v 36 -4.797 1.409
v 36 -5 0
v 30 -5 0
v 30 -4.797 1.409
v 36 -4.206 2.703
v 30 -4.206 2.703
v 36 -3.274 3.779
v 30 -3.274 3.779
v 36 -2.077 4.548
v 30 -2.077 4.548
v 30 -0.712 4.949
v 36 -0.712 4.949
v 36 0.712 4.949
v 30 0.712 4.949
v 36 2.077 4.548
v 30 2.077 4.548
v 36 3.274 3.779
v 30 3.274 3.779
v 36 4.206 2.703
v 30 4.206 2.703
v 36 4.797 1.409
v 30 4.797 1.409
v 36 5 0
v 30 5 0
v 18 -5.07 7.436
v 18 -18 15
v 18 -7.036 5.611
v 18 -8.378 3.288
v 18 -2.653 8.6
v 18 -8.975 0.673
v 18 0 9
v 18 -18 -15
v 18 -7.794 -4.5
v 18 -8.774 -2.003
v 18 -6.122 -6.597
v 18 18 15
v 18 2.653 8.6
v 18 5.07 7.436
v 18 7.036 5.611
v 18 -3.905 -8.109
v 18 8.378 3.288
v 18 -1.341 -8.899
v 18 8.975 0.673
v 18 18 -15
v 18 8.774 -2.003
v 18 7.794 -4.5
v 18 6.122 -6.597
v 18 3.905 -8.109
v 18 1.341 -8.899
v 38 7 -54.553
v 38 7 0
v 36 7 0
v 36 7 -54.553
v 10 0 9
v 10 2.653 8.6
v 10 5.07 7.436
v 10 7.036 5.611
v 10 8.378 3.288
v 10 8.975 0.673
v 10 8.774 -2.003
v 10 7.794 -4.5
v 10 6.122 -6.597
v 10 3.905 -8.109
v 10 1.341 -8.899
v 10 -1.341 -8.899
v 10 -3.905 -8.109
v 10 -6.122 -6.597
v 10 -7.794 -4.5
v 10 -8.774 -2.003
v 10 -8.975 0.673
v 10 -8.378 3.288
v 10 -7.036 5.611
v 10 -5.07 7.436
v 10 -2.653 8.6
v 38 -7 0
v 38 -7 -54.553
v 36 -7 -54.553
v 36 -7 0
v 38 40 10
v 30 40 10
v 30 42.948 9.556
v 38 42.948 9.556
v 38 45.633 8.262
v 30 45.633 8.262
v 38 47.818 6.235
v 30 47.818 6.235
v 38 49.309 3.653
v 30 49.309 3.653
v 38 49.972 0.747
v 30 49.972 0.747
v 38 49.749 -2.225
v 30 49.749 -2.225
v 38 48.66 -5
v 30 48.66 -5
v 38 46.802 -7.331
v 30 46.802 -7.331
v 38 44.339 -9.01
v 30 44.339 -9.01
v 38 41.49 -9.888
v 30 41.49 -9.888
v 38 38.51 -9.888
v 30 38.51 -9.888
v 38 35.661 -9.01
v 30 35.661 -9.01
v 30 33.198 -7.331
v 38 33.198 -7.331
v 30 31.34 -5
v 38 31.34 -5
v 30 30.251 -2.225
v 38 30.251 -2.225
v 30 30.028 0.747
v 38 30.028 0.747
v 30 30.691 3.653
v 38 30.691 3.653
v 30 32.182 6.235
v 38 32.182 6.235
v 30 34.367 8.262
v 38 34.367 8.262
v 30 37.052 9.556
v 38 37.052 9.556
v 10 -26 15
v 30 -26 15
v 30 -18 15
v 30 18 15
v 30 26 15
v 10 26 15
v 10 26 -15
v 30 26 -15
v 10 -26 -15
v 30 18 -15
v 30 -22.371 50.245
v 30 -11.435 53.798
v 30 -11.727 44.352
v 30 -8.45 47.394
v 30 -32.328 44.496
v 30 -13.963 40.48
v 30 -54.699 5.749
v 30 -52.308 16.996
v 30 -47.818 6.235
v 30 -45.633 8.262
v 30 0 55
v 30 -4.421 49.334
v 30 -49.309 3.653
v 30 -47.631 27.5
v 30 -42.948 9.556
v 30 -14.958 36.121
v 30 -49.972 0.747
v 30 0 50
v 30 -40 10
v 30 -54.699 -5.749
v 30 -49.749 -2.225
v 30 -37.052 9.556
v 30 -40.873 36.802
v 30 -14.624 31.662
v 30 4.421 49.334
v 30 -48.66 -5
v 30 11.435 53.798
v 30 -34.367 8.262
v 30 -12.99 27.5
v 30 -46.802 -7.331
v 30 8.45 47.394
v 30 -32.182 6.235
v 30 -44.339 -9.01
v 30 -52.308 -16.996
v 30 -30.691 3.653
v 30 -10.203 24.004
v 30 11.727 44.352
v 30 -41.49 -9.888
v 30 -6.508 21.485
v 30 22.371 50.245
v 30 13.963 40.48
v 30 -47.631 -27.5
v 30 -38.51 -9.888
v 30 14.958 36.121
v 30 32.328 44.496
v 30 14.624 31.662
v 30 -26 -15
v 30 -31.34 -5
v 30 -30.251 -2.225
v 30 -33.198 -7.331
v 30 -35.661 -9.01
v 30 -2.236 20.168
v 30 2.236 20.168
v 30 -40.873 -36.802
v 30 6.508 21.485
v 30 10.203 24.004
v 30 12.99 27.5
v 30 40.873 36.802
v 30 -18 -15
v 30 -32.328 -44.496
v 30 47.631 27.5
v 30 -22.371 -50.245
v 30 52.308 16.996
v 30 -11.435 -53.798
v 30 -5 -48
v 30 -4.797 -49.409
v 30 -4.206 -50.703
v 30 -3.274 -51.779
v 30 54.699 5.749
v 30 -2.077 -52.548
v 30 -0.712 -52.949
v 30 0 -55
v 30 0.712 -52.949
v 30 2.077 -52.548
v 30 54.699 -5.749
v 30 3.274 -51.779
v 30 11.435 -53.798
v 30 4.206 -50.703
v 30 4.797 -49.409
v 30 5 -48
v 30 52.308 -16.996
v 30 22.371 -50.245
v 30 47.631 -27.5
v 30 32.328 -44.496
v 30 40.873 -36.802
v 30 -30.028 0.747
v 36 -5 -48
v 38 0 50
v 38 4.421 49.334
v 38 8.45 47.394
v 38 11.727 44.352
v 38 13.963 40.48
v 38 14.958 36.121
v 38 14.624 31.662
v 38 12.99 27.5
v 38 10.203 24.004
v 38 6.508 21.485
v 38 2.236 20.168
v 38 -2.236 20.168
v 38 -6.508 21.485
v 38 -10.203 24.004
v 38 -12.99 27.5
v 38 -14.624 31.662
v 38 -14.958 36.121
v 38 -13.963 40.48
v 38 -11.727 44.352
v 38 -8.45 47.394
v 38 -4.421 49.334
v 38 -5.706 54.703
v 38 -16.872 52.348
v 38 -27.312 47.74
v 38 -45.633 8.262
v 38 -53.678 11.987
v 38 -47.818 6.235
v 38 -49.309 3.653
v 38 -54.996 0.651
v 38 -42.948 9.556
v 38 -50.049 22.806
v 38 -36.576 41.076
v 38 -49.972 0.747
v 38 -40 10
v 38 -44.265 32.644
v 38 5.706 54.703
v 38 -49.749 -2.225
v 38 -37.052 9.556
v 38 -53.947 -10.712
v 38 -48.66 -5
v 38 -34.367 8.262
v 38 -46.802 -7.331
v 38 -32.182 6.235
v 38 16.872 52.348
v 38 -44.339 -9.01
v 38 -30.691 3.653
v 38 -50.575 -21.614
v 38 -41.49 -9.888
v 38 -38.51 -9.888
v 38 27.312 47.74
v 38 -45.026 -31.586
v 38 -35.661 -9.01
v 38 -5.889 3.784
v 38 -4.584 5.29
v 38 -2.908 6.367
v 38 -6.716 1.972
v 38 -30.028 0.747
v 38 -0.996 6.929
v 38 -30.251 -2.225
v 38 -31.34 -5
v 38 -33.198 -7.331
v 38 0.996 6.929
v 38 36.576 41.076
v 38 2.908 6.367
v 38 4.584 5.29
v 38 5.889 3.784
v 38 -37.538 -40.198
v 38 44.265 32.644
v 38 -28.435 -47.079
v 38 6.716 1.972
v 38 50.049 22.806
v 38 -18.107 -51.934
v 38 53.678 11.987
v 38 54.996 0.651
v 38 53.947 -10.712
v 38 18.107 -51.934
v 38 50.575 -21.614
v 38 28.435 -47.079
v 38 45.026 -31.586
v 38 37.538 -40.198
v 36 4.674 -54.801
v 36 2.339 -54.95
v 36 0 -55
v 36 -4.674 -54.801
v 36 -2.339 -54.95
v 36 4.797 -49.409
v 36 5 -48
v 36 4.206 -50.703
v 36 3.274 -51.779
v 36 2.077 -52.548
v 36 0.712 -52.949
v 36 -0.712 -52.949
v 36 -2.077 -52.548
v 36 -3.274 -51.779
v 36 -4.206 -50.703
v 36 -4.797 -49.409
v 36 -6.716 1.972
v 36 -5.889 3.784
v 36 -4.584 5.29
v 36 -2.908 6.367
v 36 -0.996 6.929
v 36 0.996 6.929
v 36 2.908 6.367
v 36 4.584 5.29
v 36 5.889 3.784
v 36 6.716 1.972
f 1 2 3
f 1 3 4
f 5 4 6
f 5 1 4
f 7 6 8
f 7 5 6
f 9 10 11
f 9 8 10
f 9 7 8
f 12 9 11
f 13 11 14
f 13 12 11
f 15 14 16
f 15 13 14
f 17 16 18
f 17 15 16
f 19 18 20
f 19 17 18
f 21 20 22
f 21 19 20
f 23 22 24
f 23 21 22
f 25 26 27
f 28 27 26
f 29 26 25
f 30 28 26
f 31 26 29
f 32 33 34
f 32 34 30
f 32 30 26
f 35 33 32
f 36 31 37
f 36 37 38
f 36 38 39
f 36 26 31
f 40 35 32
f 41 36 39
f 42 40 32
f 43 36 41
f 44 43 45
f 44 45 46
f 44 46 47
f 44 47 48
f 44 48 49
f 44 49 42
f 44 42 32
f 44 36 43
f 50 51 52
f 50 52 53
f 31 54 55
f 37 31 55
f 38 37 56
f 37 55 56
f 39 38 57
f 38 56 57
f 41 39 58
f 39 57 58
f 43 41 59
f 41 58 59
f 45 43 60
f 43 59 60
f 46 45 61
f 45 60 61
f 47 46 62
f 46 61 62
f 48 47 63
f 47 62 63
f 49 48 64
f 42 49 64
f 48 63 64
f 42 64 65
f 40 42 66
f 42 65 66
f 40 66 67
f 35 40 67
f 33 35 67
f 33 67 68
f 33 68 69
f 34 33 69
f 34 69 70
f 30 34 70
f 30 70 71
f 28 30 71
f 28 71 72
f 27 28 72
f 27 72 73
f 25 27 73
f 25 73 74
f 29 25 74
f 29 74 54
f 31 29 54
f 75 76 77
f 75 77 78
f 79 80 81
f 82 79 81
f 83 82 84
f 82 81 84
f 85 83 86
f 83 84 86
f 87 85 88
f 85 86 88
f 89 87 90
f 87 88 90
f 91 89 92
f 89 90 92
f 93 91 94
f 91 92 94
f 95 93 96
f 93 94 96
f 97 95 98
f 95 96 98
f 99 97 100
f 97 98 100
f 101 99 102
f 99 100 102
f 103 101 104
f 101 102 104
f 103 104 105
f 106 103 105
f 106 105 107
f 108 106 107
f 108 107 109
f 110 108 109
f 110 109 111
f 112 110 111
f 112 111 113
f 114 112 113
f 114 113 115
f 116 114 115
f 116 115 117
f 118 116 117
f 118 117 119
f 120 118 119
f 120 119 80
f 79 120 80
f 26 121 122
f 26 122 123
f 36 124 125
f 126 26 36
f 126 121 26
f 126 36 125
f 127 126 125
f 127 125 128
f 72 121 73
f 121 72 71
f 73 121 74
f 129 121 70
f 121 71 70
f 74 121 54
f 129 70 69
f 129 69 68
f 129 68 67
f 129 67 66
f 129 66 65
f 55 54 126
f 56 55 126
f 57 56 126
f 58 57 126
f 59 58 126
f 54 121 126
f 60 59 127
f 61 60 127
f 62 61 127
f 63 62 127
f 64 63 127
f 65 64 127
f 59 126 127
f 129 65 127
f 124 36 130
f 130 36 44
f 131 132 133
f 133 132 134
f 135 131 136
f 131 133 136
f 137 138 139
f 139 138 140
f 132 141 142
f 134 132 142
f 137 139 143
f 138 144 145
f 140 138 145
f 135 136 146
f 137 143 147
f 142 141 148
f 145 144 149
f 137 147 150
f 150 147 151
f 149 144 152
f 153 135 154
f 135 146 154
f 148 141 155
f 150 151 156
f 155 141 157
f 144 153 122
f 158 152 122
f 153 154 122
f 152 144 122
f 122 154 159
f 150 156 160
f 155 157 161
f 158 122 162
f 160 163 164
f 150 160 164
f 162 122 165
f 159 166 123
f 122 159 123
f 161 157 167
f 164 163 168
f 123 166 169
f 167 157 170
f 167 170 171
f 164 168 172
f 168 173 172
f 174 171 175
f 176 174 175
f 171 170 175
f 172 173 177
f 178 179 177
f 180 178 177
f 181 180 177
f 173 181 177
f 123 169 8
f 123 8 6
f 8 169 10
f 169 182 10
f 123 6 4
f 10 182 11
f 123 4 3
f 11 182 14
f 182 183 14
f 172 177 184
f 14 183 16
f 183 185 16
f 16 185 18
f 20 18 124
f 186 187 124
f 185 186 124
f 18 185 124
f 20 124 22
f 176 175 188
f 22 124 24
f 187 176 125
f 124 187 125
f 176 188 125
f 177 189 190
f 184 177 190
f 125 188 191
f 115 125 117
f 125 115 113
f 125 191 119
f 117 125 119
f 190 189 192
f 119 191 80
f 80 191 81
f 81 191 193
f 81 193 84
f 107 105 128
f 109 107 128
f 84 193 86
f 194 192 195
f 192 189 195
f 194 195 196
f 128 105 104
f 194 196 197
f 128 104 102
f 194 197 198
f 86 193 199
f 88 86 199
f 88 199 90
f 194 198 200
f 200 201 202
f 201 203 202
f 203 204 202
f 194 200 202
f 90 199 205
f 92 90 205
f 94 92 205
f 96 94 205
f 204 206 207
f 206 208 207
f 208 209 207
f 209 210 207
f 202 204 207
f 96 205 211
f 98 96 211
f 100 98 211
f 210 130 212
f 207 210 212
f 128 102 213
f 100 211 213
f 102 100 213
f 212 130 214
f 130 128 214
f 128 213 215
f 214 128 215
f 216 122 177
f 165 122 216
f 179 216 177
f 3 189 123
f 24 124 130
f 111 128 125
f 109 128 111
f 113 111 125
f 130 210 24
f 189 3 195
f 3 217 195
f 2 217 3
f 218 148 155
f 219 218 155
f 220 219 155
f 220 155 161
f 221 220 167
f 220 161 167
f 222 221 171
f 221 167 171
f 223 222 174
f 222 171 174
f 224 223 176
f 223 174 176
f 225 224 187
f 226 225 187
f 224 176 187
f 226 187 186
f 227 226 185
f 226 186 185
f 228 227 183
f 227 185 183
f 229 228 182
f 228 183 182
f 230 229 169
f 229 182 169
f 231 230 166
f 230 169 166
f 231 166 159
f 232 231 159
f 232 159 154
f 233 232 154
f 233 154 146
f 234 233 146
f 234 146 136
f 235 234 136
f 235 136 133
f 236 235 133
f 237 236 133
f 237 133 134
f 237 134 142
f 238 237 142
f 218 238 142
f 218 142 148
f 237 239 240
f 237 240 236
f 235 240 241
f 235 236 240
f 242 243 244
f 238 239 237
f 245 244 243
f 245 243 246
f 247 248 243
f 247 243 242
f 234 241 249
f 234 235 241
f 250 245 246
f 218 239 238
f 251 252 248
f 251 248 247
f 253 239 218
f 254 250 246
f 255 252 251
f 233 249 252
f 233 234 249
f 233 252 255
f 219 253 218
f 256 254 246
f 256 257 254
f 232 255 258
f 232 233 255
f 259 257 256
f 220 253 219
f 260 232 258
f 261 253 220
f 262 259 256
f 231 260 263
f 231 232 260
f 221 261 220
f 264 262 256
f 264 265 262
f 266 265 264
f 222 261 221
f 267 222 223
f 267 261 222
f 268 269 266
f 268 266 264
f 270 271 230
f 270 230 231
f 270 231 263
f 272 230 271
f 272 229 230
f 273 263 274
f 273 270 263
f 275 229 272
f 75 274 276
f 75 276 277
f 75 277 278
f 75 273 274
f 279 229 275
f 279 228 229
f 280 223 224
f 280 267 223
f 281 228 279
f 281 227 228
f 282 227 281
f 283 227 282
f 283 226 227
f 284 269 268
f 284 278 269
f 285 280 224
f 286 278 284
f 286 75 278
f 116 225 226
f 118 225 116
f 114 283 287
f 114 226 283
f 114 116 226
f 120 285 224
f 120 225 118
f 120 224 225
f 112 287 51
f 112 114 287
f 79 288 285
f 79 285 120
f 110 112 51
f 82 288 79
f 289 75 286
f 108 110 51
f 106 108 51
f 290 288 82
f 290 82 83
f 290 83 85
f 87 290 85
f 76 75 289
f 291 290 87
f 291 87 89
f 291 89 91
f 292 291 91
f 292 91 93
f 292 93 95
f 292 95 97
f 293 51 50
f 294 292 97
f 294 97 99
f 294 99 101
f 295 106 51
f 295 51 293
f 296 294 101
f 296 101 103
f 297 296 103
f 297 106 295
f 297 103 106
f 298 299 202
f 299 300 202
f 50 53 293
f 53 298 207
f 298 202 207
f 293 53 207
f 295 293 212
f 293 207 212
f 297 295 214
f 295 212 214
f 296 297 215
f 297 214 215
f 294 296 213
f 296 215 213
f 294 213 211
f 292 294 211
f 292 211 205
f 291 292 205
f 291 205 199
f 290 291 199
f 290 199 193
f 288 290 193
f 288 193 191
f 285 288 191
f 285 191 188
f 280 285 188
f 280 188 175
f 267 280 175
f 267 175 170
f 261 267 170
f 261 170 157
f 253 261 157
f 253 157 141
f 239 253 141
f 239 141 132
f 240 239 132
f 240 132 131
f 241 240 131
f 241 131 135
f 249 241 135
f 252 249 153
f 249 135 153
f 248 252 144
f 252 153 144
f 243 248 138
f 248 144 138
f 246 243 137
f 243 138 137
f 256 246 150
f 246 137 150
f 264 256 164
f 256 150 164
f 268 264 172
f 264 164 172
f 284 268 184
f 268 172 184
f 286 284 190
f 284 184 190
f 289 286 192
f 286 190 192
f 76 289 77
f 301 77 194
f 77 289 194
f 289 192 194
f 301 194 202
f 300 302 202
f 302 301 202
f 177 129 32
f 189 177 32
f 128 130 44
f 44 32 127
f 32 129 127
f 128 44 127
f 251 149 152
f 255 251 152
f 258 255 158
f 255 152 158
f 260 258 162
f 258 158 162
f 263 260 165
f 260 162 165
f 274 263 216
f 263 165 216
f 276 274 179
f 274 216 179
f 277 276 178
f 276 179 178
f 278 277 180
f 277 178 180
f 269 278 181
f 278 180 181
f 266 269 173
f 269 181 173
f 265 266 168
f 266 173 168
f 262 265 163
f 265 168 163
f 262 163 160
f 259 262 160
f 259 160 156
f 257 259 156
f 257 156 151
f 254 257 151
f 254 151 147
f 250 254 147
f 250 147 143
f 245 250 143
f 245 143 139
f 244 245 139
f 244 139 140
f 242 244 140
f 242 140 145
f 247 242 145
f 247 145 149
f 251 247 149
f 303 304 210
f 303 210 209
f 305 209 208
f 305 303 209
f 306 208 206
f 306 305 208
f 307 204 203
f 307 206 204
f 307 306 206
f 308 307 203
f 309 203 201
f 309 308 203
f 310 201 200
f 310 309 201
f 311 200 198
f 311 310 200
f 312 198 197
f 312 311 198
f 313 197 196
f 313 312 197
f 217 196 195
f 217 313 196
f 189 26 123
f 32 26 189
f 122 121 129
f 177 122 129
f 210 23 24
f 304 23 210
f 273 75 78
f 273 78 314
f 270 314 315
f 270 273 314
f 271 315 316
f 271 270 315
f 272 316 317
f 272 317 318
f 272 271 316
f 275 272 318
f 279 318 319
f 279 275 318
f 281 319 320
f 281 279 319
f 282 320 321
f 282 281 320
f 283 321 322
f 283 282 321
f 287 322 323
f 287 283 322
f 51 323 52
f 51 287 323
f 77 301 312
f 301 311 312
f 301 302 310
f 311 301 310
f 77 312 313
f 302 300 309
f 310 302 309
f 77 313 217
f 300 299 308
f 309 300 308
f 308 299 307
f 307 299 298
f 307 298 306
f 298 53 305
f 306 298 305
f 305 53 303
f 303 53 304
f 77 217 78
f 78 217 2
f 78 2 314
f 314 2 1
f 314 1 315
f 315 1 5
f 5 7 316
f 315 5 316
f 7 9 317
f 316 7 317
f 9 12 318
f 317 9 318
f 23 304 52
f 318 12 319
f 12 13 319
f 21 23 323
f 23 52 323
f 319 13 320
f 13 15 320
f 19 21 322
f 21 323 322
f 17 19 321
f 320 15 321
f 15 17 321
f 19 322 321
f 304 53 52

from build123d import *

# Parameters (mm, degrees)
SKETCH_1_R          = 7.5
EXTRUDE_1_DEPTH     = 10
SKETCH_5_W          = 30
SKETCH_5_H          = 52
EXTRUDE_2_DEPTH     = 8
SKETCH_6_W          = 30
SKETCH_6_H          = 8
EXTRUDE_3_DEPTH     = 12
SKETCH_7_R          = 55
EXTRUDE_4_DEPTH     = 8
CUT_EXTRUDE_4_REACH = 40
CUT_EXTRUDE_6_DEPTH = 2
CUT_EXTRUDE_7_REACH = 40
SKETCH_12_R         = 9
SKETCH_13_R         = 10
SKETCH_13_R_2       = 15
CUT_EXTRUDE_8_DEPTH = 10


with BuildPart() as part:
    # 草图1 → 凸台-拉伸1 (new body)
    with BuildSketch(Plane(origin=(0, 0, 0), x_dir=(0, 0, -1), z_dir=(1, 0, 0))):
        Circle(SKETCH_1_R)
    extrude(amount=EXTRUDE_1_DEPTH)

    # 草图5 → 凸台-拉伸2 (add)
    with BuildSketch(Plane(origin=(10, 0, 0), x_dir=(0, 0, -1), z_dir=(1, 0, 0))):
        Rectangle(SKETCH_5_W, SKETCH_5_H)
    extrude(amount=EXTRUDE_2_DEPTH)

    # 草图6 → 凸台-拉伸3 (add)
    with BuildSketch(Plane(origin=(18, 0, 0), x_dir=(0, 0, -1), z_dir=(1, 0, 0))):
        with Locations((0, 22)):
            Rectangle(SKETCH_6_W, SKETCH_6_H)
        with Locations((0, -22)):
            Rectangle(SKETCH_6_W, SKETCH_6_H)
    extrude(amount=EXTRUDE_3_DEPTH)

    # 草图7 → 凸台-拉伸4 (add)
    with BuildSketch(Plane(origin=(30, 0, 0), x_dir=(0, 0, -1), z_dir=(1, 0, 0))):
        Circle(SKETCH_7_R)
    extrude(amount=EXTRUDE_4_DEPTH)

    # 草图8 → 切除-拉伸4 (cut, up to next)
    with BuildSketch(Plane(origin=(38, 0, 0), x_dir=(0, 0, -1), z_dir=(1, 0, 0)), mode=Mode.PRIVATE) as cut_extrude_4_sk1:
        with BuildLine():
            Line((0, 5), (48, 5))
            ThreePointArc((48, 5), (53, 0), (48, -5))
            Line((48, -5), (0, -5))
            ThreePointArc((0, -5), (-5, 0), (0, 5))
        make_face()
    cut_extrude_4_tool1 = extrude(cut_extrude_4_sk1.sketch, amount=-CUT_EXTRUDE_4_REACH, mode=Mode.PRIVATE) & part.part
    add(cut_extrude_4_tool1.solids().sort_by_distance((38, 0, -24))[0], mode=Mode.SUBTRACT)

    # 草图11 → 切除-拉伸6 (cut)
    with BuildSketch(Plane(origin=(38, 0, 0), x_dir=(0, 0, -1), z_dir=(1, 0, 0))):
        with BuildLine():
            Line((0, 7), (54.552726788, 7))
            ThreePointArc((54.552726788, 7), (55, 0), (54.552726788, -7))
            Line((54.552726788, -7), (0, -7))
            ThreePointArc((0, -7), (-7, 0), (0, 7))
        make_face()
    extrude(amount=-CUT_EXTRUDE_6_DEPTH, mode=Mode.SUBTRACT)

    # 草图12 → 切除-拉伸7 (cut, up to next)
    with BuildSketch(Plane.ZY, mode=Mode.PRIVATE) as cut_extrude_7_sk1:
        Circle(SKETCH_12_R)
    cut_extrude_7_tool1 = extrude(cut_extrude_7_sk1.sketch, amount=-CUT_EXTRUDE_7_REACH, mode=Mode.PRIVATE) & part.part
    add(cut_extrude_7_tool1.solids().sort_by_distance((0, 0, 0))[0], mode=Mode.SUBTRACT)

    # 草图13 → 切除-拉伸8 (cut)
    with BuildSketch(Plane.ZY.offset(-30)):
        with Locations((0, 40)):
            Circle(SKETCH_13_R)
        with Locations((35, 0)):
            Circle(SKETCH_13_R_2)
        with Locations((0, -40)):
            Circle(SKETCH_13_R)
    extrude(amount=-CUT_EXTRUDE_8_DEPTH, mode=Mode.SUBTRACT)


solid = part.part
